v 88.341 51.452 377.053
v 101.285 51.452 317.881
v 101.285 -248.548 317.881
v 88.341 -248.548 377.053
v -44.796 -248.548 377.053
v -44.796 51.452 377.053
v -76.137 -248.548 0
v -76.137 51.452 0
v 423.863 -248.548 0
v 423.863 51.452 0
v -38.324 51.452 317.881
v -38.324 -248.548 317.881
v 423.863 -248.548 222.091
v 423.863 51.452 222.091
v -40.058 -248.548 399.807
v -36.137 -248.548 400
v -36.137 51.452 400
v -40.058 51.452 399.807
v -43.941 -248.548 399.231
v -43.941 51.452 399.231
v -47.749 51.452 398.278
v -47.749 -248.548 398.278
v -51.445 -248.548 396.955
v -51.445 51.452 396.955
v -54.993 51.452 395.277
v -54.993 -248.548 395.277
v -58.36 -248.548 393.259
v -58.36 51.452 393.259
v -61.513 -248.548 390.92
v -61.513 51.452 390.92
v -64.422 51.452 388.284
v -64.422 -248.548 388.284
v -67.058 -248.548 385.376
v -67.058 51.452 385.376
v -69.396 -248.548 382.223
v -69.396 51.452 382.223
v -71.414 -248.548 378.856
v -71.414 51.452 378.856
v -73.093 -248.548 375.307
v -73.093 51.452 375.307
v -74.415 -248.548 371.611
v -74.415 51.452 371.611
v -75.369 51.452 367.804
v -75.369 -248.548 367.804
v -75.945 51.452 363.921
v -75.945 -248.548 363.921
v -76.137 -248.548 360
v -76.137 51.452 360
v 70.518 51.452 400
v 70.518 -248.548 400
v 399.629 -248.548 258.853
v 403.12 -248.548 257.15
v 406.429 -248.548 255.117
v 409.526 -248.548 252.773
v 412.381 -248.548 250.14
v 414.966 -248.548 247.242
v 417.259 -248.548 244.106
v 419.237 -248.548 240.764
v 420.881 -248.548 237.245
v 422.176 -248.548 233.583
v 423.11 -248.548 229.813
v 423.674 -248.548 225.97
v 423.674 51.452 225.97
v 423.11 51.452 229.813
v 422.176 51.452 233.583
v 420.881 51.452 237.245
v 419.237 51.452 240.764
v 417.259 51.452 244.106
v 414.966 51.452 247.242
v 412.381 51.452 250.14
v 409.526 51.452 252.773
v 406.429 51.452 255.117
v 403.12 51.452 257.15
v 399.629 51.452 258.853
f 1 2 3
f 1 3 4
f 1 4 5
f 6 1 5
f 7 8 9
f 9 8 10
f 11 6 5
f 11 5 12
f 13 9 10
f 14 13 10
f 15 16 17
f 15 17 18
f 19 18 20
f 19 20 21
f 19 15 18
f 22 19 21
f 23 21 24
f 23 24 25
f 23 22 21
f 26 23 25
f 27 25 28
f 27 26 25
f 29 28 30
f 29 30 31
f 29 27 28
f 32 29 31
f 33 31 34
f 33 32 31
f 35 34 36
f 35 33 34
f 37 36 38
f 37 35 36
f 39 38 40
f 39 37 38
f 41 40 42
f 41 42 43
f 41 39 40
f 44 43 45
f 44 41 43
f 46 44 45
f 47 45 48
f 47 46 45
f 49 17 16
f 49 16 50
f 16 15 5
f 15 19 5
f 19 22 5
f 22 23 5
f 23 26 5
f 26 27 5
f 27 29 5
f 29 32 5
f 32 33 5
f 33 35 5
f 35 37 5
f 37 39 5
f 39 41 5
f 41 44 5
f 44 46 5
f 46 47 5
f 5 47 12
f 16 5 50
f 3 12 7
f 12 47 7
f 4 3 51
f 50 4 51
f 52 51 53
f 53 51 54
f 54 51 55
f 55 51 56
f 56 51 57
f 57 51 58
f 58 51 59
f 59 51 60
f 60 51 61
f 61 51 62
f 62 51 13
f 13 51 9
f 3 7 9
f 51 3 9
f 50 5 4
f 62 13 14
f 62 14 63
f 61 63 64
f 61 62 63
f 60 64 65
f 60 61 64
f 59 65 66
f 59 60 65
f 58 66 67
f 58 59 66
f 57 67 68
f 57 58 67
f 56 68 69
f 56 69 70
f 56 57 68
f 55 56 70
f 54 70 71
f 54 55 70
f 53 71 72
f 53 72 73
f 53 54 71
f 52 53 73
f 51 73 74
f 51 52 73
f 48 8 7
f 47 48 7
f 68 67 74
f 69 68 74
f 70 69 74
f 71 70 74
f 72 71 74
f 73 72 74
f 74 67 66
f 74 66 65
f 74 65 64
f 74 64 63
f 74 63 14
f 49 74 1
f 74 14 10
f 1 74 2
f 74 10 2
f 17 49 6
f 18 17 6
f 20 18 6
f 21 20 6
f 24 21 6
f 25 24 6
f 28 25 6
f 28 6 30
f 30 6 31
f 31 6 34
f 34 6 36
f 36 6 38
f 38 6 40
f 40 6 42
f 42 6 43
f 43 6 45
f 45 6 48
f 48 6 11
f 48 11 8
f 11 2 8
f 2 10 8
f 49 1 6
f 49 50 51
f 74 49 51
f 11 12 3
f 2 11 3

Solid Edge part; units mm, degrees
sketch "Sketch1" plane through (0, 0, 0) normal (0, 0, 1) x (1, 0, 0)
  line L0 (-76.1374, -248.5483) -> (423.8626, -248.5483)
  line L1 (423.8626, -248.5483) -> (423.8626, 51.4517)
  line L2 (423.8626, 51.4517) -> (-76.1374, 51.4517)
  line L3 (-76.1374, 51.4517) -> (-76.1374, -248.5483)
  dimension "D1" = 300
  dimension "D2" = 500
extrude "Protrusion1" add sketch "Sketch1" along normal blind 400
sketch "Sketch2" plane through (173.8626, -248.5483, 200) normal (0, -1, 0) x (1, 0, 0)
  line L0 (-144.6934, 217.7335) -> (290.7737, 30.9727)
  line L1 (290.7737, 30.9727) -> (282.4526, 244.5457)
  line L2 (282.4526, 244.5457) -> (-144.6934, 217.7335)
  line L3 (-218.6581, 177.053) -> (-212.1862, 117.8812)
  line L4 (-212.1862, 117.8812) -> (-72.5778, 117.8812)
  line L5 (-72.5778, 117.8812) -> (-85.5217, 177.053)
  line L6 (-85.5217, 177.053) -> (-218.6581, 177.053)
extrude "Cutout1" cut sketch "Sketch2" against normal through all
fillet "Round_3" radius 40 2 edges at (-76.1374, -98.5483, 400) (423.8626, -98.5483, 248.4595)
properties material "Aluminum, 6061-T6"
